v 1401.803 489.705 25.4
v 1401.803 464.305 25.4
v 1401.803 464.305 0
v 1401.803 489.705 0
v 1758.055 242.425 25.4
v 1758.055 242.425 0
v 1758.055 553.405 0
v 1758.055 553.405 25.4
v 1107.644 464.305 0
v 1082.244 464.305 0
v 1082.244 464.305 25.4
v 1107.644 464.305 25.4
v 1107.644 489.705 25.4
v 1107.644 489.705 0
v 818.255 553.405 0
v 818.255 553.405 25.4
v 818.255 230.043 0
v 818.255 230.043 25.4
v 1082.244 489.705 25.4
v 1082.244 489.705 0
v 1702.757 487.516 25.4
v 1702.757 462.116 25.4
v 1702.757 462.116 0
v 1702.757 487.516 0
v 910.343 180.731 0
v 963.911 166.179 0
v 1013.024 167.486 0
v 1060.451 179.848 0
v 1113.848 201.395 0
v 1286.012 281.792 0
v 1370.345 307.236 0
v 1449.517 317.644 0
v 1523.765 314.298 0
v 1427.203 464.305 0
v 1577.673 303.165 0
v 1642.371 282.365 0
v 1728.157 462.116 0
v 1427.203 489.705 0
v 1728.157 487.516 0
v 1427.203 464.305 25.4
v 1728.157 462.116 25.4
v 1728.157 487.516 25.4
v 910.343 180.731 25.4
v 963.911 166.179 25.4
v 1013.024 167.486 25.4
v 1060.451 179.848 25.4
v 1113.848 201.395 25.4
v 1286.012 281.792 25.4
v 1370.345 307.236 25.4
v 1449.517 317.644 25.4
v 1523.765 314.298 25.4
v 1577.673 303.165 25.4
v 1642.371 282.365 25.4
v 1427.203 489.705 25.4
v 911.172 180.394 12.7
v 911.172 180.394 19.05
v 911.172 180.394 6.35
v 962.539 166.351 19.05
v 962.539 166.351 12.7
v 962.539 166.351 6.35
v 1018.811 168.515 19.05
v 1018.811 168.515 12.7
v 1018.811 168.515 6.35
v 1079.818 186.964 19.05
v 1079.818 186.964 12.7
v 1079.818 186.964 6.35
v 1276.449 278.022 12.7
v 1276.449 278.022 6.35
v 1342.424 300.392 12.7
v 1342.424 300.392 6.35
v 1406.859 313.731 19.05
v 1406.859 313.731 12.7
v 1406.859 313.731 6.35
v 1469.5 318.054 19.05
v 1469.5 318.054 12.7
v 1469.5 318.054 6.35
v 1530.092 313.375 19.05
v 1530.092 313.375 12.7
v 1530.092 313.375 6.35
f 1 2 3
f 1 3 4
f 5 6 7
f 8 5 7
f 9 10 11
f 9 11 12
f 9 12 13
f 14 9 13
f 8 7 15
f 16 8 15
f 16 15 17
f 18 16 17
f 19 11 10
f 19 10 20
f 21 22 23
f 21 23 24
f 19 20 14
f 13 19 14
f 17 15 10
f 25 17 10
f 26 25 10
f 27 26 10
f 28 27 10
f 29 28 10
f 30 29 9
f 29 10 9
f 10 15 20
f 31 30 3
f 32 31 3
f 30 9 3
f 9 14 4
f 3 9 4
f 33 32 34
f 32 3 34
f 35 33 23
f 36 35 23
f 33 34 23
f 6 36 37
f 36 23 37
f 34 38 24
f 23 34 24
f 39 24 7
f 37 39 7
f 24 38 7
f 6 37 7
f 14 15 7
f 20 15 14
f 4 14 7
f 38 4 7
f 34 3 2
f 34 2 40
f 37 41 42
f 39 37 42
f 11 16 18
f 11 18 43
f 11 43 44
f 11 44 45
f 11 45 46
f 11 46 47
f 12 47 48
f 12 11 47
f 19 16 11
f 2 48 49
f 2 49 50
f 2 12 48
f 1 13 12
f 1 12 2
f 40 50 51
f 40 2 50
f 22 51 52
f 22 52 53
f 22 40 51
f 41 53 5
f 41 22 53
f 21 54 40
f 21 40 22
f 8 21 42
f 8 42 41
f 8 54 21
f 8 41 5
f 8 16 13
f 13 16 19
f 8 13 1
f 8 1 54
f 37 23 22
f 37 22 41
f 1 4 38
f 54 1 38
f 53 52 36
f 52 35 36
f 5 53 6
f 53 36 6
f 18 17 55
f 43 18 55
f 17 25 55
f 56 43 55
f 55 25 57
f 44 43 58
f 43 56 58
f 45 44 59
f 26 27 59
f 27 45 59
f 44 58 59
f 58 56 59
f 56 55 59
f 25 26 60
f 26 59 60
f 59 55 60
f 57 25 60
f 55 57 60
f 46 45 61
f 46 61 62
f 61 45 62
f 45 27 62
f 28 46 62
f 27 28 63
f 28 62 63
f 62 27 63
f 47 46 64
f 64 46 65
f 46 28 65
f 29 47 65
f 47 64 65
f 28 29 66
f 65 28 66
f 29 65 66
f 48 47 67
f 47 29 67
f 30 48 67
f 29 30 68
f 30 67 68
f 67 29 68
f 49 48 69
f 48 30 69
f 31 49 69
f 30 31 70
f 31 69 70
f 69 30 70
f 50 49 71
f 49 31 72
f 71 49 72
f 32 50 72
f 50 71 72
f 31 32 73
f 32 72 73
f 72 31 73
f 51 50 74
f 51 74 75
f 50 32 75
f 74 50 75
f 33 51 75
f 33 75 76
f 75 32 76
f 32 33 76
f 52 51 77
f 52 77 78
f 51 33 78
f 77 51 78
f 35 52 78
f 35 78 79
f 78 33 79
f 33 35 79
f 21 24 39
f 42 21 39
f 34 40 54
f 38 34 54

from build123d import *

# Parameters (mm, degrees)
F0_W     = 25.4
F0_H     = 25.4
F1_DEPTH = 25.4


with BuildPart() as f1:
    # F0 (on Top) → F1 (new body)
    with BuildSketch(Plane.XY):
        with BuildLine():
            Line((1377.054914093, 553.4051656723), (818.254914093, 553.4051656723))
            Line((818.254914093, 553.4051656723), (818.254914093, 230.0433814526))
            add(Edge.make_bspline(
                [(818.254914093, 230.0433814526), (869.7513088234, 201.0817050342), (993.6259790946, 113.597779136), (1272.8033875168, 302.84451887), (1538.9749454978, 336.9281412477), (1684.7084265303, 262.9397603077), (1758.054914093, 242.4248605967)],
                knots=[0, 0, 0, 0, 0.215962379, 0.4972360733, 0.7570041226, 1, 1, 1, 1], degree=3))
            Line((1758.054914093, 242.4248605967), (1758.054914093, 553.4051656723))
            Line((1758.054914093, 553.4051656723), (1377.054914093, 553.4051656723))
        make_face()
        with Locations((1094.9438001633, 477.0052220345)):
            Rectangle(F0_W, F0_H, mode=Mode.SUBTRACT)
        with Locations((1414.502778244, 477.0052220345)):
            Rectangle(F0_W, F0_H, mode=Mode.SUBTRACT)
        with Locations((1715.457358551, 474.8164500713)):
            Rectangle(F0_W, F0_H, mode=Mode.SUBTRACT)
    extrude(amount=F1_DEPTH)


solid = f1.part
